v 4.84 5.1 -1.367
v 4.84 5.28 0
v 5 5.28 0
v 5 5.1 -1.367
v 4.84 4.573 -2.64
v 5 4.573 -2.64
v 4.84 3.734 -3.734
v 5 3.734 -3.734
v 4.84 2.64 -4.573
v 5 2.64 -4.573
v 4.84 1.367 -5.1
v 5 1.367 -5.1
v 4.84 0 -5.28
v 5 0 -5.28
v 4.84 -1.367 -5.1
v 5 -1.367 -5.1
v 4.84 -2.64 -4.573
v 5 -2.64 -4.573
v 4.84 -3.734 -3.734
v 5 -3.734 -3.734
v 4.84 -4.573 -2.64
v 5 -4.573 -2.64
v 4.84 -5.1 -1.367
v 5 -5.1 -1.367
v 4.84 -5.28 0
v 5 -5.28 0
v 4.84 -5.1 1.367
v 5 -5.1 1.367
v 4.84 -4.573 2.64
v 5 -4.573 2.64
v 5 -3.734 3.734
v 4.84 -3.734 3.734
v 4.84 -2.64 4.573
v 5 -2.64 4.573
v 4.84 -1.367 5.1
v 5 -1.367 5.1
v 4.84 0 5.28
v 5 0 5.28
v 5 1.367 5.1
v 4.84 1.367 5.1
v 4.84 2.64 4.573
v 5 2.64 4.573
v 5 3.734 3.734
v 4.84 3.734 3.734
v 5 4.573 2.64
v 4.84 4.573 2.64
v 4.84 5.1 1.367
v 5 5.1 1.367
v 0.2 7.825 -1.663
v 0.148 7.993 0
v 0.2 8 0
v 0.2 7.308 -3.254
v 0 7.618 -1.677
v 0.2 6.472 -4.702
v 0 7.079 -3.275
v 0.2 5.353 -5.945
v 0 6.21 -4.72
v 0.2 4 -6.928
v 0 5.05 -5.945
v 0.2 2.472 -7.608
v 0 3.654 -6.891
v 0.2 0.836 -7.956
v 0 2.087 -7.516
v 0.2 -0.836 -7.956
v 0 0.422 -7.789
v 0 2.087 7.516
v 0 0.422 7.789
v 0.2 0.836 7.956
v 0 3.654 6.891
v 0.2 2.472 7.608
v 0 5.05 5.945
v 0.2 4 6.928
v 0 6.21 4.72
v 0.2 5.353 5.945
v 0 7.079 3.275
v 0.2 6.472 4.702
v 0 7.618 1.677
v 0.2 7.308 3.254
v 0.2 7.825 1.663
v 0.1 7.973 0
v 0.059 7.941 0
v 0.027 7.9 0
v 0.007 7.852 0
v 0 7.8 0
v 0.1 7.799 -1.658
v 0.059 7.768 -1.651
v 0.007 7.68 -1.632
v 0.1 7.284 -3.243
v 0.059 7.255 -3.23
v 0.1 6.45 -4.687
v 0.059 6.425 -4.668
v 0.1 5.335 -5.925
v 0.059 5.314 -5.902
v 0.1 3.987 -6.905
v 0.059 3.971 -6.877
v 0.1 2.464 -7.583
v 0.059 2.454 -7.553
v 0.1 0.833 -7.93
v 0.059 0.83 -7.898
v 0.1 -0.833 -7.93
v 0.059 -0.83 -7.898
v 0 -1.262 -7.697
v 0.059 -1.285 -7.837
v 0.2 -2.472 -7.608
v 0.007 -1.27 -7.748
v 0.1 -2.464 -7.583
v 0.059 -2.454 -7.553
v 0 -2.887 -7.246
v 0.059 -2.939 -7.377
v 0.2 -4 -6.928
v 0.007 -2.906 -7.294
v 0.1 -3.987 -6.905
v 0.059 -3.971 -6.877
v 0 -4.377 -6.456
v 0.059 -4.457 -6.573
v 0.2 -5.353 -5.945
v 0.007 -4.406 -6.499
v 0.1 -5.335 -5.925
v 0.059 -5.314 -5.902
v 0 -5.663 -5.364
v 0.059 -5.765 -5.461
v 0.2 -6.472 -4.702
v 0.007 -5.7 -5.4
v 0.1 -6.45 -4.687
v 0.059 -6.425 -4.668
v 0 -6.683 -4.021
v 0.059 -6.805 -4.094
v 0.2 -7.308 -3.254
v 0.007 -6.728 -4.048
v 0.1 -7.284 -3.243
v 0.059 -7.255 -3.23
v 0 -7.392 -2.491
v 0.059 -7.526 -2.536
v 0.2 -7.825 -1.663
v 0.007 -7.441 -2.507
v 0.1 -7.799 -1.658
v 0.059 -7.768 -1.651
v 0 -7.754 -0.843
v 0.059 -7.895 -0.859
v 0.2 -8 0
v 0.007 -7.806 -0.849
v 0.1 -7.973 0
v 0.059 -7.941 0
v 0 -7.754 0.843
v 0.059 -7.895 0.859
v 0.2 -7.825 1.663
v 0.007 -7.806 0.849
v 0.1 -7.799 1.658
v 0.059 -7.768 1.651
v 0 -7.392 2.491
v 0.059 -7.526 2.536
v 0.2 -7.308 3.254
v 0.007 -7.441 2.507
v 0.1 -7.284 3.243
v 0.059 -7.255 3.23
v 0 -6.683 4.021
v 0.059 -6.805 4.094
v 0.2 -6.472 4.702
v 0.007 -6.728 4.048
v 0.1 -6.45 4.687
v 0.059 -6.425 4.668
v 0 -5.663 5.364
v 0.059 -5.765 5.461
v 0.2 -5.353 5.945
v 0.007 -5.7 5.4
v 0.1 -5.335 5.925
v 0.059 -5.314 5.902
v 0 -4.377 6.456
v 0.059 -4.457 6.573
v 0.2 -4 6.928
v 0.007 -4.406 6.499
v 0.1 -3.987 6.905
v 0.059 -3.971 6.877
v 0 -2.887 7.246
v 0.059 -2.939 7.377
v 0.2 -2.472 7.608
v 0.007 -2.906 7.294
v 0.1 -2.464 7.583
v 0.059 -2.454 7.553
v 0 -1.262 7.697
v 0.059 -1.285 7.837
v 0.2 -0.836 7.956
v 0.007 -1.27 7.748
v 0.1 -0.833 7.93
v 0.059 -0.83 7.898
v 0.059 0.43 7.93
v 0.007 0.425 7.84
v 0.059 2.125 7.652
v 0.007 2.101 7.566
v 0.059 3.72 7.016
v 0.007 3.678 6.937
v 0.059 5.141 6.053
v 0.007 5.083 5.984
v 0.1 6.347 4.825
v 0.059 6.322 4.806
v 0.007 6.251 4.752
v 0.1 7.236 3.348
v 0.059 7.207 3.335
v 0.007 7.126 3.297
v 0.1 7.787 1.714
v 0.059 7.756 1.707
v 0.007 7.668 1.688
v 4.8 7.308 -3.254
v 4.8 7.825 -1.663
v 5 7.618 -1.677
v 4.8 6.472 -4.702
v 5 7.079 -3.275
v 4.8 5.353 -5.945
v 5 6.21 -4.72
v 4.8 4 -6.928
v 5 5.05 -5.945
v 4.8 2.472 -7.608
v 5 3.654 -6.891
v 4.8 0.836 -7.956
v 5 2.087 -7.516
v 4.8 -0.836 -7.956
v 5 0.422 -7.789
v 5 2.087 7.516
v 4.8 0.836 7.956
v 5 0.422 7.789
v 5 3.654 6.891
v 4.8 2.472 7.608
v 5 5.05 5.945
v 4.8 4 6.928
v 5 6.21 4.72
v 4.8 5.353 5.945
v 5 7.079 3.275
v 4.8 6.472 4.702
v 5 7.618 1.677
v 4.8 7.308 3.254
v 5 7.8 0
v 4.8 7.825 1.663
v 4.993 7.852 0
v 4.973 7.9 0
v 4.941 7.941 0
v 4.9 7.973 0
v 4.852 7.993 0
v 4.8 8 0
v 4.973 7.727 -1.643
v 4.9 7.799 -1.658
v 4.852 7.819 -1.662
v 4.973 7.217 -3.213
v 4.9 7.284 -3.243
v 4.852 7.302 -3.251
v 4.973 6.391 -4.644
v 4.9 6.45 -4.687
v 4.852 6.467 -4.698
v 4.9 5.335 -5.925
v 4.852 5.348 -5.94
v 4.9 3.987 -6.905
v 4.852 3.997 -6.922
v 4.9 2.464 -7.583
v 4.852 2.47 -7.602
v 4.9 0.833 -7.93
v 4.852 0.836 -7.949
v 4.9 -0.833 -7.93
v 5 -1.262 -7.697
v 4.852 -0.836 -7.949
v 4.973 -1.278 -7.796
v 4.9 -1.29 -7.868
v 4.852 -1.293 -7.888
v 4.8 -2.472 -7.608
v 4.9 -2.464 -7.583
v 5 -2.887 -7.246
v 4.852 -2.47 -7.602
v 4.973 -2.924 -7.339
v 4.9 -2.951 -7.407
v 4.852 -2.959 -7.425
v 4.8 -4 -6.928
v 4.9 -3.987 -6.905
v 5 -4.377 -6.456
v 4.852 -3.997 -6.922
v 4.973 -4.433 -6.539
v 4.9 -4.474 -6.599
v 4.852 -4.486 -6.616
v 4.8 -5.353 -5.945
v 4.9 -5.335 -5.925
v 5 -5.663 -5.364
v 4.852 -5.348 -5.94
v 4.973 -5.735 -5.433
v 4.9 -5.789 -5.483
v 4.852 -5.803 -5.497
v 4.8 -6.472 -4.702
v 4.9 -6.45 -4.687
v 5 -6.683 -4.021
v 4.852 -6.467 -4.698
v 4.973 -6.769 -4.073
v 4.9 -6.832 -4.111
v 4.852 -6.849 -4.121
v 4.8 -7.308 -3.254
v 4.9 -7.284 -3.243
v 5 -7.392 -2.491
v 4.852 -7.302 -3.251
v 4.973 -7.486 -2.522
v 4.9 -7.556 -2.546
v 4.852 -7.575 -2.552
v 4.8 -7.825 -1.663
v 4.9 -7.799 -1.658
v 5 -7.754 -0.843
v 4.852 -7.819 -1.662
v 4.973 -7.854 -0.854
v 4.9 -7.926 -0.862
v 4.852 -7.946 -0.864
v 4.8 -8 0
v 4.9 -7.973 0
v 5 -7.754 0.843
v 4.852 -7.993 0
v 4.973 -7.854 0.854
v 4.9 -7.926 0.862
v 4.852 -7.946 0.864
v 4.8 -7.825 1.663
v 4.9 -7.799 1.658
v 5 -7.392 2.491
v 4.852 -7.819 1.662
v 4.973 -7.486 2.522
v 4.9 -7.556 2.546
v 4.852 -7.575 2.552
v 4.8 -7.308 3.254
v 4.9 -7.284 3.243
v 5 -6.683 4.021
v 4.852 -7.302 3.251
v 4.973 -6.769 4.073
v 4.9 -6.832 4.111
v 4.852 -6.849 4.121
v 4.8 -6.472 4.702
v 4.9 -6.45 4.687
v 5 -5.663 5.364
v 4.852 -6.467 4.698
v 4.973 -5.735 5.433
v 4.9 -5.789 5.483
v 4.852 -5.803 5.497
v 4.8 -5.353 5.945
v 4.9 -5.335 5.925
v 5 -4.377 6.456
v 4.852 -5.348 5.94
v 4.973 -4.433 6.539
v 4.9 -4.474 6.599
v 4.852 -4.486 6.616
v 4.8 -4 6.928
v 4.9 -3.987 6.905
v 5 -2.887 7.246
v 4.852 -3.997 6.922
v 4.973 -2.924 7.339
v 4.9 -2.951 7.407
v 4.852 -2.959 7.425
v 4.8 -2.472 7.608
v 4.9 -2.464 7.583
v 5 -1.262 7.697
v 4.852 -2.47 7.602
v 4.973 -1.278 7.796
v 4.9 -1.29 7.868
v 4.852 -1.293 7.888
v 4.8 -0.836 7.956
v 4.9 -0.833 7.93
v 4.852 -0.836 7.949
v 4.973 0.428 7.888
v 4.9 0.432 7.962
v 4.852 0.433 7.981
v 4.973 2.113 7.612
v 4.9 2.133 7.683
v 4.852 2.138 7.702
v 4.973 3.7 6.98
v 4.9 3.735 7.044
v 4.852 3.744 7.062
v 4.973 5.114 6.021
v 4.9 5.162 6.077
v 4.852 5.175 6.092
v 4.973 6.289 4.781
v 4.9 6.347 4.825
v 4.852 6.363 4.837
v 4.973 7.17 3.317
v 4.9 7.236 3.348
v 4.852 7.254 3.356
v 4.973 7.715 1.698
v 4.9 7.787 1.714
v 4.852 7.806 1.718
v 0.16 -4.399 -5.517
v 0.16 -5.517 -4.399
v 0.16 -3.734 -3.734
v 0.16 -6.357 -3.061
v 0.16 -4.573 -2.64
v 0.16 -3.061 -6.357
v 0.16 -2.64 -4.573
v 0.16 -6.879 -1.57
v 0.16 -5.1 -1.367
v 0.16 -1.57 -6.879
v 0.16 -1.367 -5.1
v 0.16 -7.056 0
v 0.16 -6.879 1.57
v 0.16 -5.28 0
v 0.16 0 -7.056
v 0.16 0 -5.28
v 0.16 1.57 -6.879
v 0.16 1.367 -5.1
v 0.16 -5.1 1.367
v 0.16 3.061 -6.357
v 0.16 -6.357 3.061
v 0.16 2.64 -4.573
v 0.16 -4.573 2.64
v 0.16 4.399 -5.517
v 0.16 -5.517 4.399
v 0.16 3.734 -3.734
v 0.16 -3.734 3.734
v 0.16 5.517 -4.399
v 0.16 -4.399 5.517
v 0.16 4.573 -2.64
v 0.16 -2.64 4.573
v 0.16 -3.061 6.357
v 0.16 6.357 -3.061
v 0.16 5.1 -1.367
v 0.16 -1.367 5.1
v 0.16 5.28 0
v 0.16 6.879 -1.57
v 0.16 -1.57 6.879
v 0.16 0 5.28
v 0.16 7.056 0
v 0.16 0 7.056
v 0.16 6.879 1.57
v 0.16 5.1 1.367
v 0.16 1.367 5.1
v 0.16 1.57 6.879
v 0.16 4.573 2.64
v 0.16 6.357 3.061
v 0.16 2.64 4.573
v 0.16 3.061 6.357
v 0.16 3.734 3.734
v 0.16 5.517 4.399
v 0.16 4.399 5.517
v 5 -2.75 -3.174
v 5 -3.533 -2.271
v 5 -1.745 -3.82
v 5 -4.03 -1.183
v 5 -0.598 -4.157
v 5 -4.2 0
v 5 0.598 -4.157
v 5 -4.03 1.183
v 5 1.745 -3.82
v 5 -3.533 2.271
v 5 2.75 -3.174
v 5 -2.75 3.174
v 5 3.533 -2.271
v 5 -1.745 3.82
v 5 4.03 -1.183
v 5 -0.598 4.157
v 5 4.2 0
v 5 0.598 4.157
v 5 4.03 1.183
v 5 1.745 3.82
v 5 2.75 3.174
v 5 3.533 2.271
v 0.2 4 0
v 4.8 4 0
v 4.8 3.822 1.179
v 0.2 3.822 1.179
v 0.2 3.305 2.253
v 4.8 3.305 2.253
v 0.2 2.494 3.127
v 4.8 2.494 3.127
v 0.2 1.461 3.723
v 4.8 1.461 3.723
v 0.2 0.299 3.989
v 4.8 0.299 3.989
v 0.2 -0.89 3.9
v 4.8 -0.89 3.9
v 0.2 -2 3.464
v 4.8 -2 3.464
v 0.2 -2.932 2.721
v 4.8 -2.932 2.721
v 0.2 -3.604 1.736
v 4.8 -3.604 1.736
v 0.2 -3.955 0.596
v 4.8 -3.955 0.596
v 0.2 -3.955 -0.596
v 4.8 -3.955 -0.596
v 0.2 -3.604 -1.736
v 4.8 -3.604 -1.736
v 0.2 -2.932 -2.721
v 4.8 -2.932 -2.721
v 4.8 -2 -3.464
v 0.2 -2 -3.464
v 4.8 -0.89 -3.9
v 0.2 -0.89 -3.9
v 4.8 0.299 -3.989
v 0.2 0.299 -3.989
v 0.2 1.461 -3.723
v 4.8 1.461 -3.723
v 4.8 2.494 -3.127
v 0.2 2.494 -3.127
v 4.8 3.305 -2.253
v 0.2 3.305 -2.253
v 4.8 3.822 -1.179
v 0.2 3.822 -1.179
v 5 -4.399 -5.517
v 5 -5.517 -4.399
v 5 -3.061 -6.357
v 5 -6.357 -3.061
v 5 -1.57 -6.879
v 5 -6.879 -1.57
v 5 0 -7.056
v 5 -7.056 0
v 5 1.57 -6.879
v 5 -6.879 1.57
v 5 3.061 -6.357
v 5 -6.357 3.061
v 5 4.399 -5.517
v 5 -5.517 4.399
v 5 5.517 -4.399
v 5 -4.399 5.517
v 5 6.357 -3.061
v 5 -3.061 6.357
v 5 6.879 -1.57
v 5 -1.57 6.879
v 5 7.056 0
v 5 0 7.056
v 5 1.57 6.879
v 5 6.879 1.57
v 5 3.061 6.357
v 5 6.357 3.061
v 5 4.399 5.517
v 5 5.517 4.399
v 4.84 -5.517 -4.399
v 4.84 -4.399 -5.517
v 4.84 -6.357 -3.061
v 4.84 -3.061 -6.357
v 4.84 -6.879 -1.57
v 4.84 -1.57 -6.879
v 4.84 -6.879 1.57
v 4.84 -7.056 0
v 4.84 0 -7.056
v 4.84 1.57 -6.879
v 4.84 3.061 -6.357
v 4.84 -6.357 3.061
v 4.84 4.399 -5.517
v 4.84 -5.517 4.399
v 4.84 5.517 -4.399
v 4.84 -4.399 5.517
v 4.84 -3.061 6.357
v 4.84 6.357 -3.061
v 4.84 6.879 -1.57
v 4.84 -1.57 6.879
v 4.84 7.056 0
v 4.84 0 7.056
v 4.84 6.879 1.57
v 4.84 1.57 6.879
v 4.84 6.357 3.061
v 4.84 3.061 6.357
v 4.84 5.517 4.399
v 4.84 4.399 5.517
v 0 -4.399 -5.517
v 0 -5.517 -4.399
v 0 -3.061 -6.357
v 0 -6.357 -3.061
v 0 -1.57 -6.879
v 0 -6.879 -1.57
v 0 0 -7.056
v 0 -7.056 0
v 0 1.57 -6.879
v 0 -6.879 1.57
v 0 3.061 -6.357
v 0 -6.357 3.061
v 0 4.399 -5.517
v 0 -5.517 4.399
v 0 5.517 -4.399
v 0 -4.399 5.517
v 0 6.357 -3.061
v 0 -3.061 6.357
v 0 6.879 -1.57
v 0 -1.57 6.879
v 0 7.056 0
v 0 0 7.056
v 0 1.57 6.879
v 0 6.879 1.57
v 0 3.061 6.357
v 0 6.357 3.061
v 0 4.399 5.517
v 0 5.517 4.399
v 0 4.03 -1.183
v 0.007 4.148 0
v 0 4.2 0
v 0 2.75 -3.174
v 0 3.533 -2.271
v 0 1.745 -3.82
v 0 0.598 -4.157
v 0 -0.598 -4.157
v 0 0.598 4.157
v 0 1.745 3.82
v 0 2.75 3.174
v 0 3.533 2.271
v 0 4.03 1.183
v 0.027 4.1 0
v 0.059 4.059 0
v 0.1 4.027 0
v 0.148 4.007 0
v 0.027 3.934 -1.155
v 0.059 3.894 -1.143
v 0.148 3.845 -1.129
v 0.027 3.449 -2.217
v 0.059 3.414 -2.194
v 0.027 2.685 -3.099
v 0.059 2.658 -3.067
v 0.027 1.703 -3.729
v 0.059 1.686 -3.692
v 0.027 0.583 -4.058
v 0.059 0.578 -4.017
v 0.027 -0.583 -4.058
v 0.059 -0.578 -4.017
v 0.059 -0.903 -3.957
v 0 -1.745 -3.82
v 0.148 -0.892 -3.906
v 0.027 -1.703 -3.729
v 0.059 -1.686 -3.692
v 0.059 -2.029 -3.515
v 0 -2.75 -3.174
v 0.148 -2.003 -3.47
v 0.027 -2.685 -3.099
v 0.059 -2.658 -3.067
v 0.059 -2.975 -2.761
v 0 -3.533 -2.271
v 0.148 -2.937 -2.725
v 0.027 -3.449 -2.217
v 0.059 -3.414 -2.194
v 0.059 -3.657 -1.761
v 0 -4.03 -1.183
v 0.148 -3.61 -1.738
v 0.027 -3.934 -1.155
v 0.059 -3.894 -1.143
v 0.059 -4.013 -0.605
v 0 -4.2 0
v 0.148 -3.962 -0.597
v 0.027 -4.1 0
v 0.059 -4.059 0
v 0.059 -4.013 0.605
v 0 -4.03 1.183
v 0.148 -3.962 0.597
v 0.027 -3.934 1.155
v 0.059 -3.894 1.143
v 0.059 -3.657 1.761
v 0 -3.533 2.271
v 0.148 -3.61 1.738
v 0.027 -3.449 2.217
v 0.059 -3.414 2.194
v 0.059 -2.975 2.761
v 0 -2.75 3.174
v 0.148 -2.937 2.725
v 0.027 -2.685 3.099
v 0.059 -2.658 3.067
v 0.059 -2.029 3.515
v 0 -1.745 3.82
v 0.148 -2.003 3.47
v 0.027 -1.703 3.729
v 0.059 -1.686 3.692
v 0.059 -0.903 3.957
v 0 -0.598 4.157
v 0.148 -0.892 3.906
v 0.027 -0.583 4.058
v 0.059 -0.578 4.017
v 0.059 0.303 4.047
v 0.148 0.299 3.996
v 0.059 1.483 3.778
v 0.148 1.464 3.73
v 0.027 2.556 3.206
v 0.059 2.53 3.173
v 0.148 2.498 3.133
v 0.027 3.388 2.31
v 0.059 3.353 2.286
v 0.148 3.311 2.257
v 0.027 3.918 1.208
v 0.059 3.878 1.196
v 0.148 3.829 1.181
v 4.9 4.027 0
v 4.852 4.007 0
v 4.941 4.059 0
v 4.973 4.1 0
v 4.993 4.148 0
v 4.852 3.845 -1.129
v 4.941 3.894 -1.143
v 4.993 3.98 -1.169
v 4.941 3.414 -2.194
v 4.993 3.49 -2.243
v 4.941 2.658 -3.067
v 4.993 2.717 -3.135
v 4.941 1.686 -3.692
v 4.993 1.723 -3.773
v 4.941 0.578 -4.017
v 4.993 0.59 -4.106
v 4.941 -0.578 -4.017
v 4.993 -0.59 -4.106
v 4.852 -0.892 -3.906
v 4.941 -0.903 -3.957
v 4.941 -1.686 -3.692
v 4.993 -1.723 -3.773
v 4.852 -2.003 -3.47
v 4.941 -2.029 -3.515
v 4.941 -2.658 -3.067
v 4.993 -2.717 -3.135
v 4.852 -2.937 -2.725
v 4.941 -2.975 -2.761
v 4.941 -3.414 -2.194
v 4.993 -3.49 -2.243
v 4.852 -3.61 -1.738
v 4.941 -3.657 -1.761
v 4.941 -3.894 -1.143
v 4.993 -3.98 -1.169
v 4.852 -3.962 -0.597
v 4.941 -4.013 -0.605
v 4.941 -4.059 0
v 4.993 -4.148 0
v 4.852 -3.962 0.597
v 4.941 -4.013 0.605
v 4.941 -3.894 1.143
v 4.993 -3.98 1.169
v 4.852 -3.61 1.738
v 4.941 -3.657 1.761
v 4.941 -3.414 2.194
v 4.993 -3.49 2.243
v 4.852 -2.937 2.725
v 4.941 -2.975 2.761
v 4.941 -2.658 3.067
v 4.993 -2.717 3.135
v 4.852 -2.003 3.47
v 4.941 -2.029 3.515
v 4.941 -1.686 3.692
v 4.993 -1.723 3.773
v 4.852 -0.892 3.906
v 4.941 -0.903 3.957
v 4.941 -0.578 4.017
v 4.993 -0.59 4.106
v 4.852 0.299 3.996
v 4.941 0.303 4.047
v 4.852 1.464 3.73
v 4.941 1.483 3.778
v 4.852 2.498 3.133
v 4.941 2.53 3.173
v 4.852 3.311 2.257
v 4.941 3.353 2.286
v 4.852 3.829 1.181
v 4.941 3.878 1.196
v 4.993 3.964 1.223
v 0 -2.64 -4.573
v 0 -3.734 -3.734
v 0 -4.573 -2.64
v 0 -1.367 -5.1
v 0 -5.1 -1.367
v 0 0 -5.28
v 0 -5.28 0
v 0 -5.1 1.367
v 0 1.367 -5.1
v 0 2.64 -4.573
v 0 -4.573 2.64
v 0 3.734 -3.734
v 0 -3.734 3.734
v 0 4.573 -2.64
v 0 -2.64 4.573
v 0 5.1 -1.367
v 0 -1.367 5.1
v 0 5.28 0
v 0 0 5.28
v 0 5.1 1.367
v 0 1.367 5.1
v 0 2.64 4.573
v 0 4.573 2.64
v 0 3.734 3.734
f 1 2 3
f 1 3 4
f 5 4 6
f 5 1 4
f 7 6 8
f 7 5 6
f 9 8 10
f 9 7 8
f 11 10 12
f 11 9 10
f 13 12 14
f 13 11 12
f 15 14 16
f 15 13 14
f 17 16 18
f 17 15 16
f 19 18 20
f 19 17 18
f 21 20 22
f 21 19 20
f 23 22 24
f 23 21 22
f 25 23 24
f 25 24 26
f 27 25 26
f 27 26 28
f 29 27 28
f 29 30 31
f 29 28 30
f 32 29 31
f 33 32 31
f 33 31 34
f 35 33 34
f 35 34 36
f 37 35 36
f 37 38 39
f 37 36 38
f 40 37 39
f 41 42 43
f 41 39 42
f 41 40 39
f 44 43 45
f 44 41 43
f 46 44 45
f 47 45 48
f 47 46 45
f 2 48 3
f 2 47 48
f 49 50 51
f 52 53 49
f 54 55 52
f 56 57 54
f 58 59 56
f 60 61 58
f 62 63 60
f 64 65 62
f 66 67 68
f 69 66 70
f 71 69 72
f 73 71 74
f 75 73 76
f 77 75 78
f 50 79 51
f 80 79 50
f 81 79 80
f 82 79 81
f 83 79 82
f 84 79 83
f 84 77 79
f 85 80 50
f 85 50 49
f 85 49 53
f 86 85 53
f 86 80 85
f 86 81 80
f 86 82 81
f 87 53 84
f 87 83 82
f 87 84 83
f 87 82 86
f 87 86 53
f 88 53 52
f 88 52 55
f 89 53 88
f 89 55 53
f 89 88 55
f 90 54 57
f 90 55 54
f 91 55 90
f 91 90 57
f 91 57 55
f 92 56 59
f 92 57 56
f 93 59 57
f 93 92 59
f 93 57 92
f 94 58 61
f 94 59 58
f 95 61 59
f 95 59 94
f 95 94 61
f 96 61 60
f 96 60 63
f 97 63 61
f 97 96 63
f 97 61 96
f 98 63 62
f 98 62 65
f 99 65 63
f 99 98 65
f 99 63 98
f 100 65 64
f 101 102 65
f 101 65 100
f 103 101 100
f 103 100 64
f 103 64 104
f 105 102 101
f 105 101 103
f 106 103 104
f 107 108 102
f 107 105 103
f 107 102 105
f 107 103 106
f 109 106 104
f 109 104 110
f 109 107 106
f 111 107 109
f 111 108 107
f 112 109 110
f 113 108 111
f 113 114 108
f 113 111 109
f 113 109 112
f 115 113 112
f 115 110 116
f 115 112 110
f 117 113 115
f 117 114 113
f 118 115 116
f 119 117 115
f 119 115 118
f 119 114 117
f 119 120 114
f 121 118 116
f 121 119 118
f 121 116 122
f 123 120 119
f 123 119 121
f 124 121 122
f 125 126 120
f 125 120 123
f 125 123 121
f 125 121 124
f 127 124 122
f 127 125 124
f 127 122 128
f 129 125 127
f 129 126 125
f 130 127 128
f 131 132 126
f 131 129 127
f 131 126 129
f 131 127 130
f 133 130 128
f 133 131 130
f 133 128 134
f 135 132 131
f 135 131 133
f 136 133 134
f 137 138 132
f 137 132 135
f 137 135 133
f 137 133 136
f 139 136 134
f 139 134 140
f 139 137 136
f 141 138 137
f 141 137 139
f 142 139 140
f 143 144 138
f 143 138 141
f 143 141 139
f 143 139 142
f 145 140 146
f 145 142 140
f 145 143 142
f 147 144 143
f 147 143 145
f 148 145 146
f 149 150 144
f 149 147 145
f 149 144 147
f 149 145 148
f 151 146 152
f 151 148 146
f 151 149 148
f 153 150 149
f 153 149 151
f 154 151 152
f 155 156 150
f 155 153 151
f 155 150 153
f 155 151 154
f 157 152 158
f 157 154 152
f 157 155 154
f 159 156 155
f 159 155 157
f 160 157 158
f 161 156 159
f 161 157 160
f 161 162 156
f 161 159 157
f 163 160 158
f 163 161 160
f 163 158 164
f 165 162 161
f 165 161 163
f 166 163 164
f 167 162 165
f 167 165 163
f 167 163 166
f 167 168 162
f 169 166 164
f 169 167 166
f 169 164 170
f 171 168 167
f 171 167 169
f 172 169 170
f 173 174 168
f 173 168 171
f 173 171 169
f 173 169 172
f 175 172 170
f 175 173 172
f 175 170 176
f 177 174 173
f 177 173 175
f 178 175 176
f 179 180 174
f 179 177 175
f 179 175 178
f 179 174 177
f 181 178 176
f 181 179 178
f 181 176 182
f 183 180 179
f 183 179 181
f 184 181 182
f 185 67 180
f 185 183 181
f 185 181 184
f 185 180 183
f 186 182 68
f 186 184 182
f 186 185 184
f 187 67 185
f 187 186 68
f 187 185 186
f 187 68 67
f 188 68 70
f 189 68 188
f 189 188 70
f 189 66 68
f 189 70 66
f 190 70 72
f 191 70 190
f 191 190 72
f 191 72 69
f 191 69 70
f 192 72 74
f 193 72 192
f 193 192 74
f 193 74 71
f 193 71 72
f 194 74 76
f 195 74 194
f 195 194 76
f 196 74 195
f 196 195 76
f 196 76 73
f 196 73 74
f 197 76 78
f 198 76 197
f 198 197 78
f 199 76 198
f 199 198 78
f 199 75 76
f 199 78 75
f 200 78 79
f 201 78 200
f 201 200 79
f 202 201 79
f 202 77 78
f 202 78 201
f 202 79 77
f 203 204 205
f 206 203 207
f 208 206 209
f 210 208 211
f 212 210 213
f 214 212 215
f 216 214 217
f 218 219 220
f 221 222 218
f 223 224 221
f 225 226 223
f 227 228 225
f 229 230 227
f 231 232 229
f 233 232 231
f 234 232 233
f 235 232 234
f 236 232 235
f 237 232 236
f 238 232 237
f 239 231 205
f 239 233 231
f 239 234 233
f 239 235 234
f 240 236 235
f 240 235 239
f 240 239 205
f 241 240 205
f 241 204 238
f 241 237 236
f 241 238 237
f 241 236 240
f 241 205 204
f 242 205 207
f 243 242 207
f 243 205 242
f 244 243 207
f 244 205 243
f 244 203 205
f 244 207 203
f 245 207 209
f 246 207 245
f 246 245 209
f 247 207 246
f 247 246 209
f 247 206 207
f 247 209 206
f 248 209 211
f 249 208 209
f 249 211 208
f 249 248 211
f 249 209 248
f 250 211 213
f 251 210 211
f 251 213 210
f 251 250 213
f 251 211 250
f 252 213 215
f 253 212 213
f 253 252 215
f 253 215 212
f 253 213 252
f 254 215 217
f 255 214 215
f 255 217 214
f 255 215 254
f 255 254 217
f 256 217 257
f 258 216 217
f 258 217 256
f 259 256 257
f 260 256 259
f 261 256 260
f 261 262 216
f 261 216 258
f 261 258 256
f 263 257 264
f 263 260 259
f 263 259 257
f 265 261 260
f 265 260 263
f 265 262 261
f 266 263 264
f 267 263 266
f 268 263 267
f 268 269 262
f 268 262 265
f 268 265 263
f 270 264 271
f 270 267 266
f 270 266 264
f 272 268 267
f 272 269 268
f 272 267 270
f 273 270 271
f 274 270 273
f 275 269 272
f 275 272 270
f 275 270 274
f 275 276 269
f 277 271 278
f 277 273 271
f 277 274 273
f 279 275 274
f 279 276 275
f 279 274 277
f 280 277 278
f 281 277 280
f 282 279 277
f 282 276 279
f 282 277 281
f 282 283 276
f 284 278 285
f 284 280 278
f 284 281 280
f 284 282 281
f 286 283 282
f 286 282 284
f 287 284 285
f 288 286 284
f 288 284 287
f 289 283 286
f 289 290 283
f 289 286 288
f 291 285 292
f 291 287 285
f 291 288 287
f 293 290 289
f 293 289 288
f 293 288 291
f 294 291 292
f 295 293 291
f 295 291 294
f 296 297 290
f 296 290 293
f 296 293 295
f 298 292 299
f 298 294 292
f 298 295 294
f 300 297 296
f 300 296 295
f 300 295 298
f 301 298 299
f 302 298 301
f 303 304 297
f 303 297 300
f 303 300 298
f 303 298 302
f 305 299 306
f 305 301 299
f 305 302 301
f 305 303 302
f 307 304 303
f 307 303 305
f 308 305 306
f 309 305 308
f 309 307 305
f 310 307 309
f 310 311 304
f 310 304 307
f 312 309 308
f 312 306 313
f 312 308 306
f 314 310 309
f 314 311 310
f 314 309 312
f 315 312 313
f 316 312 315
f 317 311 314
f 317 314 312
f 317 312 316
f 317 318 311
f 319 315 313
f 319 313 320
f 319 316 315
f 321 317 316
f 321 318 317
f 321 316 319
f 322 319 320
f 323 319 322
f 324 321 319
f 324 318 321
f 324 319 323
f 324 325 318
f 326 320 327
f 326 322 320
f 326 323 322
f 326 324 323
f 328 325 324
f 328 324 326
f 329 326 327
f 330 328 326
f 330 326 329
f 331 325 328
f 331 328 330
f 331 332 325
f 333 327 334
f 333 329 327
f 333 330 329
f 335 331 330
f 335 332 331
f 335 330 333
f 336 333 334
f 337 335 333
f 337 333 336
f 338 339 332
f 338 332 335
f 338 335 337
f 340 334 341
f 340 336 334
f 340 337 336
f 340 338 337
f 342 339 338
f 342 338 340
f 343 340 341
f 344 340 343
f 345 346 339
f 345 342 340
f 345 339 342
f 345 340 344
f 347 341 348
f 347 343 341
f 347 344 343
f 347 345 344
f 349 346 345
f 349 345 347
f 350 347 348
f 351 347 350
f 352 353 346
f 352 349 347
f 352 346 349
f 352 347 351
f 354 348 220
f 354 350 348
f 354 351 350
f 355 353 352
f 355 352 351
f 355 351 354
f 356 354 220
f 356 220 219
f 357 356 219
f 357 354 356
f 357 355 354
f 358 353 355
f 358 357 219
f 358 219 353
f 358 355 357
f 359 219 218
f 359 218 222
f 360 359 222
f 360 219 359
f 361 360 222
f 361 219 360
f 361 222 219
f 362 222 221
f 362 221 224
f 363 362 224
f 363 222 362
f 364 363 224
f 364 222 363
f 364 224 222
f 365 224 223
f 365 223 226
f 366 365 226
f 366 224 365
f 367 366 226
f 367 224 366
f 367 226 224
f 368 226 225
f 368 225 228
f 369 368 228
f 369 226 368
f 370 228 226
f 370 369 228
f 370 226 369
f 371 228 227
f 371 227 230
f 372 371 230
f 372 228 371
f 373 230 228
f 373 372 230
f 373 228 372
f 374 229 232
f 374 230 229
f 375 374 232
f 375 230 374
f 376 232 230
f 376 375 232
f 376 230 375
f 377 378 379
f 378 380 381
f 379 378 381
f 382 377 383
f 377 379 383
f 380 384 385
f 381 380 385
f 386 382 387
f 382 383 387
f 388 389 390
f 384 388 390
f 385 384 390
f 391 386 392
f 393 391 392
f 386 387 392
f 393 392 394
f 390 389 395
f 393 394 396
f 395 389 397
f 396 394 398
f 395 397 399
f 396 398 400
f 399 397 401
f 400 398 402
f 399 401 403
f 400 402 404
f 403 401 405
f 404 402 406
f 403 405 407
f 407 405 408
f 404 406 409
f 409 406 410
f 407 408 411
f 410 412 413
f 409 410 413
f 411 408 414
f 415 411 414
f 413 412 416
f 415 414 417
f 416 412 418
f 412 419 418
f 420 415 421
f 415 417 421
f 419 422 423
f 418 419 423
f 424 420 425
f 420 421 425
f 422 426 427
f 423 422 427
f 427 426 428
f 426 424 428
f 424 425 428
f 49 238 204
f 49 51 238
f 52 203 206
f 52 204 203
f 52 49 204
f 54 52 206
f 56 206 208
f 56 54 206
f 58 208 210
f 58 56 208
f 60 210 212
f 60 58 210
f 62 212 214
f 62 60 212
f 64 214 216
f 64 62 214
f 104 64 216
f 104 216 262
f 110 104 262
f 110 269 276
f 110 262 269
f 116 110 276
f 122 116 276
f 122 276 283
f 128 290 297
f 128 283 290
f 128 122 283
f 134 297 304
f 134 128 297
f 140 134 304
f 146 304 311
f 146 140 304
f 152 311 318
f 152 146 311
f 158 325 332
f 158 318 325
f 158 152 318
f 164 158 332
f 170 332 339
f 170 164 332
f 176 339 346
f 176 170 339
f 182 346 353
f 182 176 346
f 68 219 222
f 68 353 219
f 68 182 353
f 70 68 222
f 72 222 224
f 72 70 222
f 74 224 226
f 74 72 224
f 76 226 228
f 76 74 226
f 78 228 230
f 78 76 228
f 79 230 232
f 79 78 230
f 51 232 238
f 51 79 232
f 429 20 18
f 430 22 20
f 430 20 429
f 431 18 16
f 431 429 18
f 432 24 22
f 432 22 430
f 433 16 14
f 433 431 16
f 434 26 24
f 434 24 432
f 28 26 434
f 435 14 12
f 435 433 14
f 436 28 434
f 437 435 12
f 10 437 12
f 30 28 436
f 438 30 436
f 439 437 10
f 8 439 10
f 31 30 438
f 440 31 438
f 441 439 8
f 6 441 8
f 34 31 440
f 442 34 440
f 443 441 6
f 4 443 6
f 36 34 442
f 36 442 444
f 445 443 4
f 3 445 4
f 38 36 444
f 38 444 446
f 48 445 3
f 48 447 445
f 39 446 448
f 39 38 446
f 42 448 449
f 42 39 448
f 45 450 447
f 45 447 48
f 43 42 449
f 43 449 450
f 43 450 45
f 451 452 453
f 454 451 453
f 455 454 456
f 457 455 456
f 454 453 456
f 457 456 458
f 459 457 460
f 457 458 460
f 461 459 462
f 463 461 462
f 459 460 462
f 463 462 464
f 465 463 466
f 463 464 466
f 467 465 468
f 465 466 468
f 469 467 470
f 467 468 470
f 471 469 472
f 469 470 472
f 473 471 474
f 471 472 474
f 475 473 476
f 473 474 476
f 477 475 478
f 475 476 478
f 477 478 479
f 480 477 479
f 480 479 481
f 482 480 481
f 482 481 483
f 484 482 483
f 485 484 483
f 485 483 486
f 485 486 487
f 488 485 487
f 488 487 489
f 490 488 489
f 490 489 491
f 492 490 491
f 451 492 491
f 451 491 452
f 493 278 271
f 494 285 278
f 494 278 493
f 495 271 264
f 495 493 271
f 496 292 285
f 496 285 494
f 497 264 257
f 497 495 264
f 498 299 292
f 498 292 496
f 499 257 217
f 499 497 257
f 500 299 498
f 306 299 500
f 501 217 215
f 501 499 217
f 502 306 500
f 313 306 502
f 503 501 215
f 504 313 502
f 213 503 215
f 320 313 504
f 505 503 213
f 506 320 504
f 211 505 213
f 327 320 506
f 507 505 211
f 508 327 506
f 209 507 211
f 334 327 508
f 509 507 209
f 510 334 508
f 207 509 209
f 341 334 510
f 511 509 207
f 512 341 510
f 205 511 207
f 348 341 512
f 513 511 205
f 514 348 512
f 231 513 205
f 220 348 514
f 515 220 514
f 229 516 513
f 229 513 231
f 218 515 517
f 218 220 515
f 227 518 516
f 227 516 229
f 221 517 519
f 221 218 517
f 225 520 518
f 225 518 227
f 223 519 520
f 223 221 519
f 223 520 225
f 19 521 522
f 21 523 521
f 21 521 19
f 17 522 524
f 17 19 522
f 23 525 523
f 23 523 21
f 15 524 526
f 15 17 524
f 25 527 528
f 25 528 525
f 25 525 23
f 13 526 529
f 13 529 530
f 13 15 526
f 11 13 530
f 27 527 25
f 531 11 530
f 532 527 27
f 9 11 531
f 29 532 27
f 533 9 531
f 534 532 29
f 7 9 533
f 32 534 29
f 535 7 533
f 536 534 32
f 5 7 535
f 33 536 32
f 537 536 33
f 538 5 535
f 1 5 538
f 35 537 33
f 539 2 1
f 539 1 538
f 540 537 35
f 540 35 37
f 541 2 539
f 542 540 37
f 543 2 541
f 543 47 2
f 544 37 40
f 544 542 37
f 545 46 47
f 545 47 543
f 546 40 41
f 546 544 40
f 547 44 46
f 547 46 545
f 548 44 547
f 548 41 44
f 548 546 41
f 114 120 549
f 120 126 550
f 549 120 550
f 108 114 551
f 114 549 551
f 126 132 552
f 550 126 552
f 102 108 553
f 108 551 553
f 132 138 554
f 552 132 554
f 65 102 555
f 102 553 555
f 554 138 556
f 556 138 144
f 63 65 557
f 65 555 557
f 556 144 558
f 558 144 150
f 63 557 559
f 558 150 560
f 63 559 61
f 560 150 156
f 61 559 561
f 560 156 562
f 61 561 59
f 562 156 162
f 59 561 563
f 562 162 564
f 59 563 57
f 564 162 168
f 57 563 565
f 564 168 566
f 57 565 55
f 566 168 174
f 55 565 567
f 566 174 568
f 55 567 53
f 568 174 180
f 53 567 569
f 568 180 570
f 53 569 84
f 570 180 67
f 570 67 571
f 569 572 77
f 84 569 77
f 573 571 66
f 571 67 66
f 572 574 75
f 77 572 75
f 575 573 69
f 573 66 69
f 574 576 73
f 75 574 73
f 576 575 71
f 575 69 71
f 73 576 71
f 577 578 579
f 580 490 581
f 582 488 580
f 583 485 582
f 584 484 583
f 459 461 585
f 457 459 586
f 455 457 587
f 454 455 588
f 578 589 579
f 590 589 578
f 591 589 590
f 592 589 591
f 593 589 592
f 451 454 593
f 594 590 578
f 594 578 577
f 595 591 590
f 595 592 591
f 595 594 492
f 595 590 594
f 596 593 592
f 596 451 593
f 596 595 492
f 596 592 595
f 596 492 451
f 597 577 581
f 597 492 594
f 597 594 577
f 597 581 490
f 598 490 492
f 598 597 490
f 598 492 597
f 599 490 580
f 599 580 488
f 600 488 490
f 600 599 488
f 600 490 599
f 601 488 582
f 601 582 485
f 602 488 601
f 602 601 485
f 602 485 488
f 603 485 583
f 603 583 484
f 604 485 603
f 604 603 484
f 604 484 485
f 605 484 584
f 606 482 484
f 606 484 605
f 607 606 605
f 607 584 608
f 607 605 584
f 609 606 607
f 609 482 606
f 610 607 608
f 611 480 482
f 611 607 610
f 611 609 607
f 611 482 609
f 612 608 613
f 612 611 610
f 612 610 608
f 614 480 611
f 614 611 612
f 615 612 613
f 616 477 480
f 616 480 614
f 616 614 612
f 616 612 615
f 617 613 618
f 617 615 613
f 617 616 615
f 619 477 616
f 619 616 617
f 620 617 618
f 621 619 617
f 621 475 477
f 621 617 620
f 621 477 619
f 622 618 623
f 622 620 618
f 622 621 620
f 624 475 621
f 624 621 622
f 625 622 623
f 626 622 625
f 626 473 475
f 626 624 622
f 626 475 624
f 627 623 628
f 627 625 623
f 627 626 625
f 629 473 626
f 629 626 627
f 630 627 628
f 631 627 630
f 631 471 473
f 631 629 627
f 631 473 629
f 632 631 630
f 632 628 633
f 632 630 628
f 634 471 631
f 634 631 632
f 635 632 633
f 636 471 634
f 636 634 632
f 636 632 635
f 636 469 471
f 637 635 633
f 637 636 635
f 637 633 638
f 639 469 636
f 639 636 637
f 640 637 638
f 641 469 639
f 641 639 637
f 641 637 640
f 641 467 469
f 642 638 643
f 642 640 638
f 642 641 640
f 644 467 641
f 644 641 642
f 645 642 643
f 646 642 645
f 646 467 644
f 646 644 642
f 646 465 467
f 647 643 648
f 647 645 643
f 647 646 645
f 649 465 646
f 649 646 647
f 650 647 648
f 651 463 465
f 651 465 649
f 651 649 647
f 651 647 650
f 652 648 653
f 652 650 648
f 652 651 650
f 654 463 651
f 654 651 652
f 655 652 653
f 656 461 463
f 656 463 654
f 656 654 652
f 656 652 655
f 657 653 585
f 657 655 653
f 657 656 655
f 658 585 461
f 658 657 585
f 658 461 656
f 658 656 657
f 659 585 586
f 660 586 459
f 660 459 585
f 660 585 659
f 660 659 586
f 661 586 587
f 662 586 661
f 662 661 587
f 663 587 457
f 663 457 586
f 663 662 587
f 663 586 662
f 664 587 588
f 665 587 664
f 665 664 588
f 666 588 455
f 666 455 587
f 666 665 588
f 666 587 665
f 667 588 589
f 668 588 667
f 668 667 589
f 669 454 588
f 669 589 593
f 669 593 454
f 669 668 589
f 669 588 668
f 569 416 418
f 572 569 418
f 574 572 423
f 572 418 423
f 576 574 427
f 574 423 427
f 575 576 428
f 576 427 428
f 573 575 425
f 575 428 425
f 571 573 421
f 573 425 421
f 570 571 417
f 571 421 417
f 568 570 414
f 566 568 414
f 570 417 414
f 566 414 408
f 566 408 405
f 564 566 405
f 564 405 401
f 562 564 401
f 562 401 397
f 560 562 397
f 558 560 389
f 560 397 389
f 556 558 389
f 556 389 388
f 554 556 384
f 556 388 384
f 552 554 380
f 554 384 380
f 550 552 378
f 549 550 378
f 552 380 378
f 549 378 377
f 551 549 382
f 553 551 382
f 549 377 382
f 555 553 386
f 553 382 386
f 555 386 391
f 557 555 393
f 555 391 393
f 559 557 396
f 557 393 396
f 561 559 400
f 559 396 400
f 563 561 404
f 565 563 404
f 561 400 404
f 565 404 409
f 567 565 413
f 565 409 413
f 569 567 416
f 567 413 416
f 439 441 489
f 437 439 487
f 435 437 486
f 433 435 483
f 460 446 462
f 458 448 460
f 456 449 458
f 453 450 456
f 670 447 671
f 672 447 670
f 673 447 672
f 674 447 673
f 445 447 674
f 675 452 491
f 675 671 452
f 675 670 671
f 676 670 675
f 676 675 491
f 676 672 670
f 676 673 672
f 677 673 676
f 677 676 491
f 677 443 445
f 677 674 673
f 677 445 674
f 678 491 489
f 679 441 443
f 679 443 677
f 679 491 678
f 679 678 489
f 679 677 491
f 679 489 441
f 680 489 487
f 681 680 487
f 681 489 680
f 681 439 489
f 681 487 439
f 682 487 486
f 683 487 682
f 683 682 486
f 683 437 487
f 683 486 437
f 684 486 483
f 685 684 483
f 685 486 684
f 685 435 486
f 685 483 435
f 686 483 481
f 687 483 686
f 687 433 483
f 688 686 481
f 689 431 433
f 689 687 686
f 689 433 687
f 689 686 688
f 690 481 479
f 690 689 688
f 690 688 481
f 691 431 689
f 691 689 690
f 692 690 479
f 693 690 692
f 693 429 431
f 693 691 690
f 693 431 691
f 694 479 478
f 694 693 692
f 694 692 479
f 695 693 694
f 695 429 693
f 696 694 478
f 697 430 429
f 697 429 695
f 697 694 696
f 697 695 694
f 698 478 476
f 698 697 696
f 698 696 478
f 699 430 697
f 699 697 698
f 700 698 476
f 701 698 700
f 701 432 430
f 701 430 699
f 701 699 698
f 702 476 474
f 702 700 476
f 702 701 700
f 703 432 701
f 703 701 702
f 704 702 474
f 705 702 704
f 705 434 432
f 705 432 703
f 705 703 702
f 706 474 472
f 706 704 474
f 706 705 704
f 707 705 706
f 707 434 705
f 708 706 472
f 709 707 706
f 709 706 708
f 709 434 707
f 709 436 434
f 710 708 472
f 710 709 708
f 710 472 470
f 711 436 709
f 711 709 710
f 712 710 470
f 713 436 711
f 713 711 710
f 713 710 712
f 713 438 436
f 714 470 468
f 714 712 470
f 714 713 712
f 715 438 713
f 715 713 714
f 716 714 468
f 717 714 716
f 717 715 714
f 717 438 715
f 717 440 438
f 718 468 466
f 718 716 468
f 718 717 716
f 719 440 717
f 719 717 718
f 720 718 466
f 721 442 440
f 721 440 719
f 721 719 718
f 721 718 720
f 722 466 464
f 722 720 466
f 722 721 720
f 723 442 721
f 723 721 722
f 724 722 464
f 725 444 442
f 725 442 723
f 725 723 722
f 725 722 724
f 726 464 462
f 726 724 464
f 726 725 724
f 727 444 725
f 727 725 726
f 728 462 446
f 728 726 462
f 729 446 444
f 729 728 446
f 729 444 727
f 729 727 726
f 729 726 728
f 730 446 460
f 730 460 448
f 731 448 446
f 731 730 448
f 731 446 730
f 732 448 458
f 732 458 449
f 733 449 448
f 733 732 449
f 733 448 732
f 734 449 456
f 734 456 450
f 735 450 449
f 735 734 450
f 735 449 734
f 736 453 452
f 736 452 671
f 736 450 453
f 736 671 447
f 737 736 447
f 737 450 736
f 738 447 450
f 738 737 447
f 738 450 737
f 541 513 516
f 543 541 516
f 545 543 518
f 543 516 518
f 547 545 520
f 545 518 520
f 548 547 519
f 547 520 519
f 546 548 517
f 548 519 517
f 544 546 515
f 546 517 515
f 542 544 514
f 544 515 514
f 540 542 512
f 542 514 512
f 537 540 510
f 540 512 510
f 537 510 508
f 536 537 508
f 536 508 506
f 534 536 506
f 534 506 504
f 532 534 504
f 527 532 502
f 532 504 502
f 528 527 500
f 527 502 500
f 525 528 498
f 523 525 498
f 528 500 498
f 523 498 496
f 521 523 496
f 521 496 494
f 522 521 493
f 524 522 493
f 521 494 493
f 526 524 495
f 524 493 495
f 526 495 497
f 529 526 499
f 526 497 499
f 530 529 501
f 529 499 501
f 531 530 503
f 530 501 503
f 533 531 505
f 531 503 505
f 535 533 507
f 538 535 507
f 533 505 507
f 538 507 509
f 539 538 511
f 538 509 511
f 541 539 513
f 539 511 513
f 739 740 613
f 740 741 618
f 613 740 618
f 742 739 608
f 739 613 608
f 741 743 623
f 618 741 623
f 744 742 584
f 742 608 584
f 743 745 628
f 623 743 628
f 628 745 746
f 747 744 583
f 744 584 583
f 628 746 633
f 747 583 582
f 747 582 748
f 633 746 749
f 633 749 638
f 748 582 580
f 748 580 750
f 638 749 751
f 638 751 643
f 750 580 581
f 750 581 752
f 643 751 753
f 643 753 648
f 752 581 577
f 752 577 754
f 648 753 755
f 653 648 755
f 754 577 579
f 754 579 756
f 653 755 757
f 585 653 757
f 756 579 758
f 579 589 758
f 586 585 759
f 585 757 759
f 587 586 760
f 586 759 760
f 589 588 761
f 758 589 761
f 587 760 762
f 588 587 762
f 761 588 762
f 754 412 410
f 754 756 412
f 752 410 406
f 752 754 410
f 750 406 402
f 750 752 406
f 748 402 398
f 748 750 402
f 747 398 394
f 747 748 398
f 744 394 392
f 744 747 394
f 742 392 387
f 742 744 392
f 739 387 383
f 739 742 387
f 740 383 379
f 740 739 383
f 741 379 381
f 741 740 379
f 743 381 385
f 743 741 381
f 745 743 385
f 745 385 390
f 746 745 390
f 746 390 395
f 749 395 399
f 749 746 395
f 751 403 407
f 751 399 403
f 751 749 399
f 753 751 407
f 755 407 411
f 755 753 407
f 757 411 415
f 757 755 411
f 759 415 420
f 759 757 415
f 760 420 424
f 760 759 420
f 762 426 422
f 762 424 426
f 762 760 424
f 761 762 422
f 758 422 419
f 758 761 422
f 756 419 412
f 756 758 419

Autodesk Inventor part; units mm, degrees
sketch "Sketch_1" plane through (0, 0, 0) normal (0, 0, 1) x (1, 0, 0)
  line L0 (4.8, 0) -> (0.2, 0)
  arc A0 (0, 4.2) -> (0.2, 4) centre (0.2, 4.2) ccw
  line L1 (0.2, 4) -> (4.8, 4)
  arc A1 (4.8, 4) -> (5, 4.2) centre (4.8, 4.2) ccw
  line L2 (5, 4.2) -> (5, 5.28)
  line L3 (5, 5.28) -> (4.84, 5.28)
  line L4 (4.84, 5.28) -> (4.84, 7.056)
  line L5 (4.84, 7.056) -> (5, 7.056)
  line L6 (5, 7.056) -> (5, 7.8)
  arc A2 (5, 7.8) -> (4.8, 8) centre (4.8, 7.8) ccw
  line L7 (4.8, 8) -> (0.2, 8)
  arc A3 (0.2, 8) -> (0, 7.8) centre (0.2, 7.8) ccw
  line L8 (0, 7.8) -> (0, 7.056)
  line L9 (0, 7.056) -> (0.16, 7.056)
  line L10 (0.16, 7.056) -> (0.16, 5.28)
  line L11 (0.16, 5.28) -> (0, 5.28)
  line L12 (0, 5.28) -> (0, 4.2)
revolve "Revolution1" add sketch "Sketch_1" angle 360 about axis through (4.8, 0, 0) along (1, 0, 0)
ref_plane "to_housing_XY" through (0, 0, 0) normal (1, 0, 0) x (0, 0, -1)
ref_plane "to_housing_YZ" through (0, 0, 0) normal (0, 0, -1) x (0, 1, 0)
ref_plane "to_housing_ZX" through (0, 0, 0) normal (0, 1, 0) x (1, 0, 0)
ref_plane "to_housing_center_XY" through (2.5, 0, 0) normal (1, 0, 0) x (0, 0, -1)
ref_plane "to_housing_center_YZ" through (2.5, 0, 0) normal (0, 0, -1) x (0, 1, 0)
ref_plane "to_housing_center_ZX" through (2.5, 0, 0) normal (0, 1, 0) x (1, 0, 0)
properties part number "B688ZZ" material "鋼、合金"
